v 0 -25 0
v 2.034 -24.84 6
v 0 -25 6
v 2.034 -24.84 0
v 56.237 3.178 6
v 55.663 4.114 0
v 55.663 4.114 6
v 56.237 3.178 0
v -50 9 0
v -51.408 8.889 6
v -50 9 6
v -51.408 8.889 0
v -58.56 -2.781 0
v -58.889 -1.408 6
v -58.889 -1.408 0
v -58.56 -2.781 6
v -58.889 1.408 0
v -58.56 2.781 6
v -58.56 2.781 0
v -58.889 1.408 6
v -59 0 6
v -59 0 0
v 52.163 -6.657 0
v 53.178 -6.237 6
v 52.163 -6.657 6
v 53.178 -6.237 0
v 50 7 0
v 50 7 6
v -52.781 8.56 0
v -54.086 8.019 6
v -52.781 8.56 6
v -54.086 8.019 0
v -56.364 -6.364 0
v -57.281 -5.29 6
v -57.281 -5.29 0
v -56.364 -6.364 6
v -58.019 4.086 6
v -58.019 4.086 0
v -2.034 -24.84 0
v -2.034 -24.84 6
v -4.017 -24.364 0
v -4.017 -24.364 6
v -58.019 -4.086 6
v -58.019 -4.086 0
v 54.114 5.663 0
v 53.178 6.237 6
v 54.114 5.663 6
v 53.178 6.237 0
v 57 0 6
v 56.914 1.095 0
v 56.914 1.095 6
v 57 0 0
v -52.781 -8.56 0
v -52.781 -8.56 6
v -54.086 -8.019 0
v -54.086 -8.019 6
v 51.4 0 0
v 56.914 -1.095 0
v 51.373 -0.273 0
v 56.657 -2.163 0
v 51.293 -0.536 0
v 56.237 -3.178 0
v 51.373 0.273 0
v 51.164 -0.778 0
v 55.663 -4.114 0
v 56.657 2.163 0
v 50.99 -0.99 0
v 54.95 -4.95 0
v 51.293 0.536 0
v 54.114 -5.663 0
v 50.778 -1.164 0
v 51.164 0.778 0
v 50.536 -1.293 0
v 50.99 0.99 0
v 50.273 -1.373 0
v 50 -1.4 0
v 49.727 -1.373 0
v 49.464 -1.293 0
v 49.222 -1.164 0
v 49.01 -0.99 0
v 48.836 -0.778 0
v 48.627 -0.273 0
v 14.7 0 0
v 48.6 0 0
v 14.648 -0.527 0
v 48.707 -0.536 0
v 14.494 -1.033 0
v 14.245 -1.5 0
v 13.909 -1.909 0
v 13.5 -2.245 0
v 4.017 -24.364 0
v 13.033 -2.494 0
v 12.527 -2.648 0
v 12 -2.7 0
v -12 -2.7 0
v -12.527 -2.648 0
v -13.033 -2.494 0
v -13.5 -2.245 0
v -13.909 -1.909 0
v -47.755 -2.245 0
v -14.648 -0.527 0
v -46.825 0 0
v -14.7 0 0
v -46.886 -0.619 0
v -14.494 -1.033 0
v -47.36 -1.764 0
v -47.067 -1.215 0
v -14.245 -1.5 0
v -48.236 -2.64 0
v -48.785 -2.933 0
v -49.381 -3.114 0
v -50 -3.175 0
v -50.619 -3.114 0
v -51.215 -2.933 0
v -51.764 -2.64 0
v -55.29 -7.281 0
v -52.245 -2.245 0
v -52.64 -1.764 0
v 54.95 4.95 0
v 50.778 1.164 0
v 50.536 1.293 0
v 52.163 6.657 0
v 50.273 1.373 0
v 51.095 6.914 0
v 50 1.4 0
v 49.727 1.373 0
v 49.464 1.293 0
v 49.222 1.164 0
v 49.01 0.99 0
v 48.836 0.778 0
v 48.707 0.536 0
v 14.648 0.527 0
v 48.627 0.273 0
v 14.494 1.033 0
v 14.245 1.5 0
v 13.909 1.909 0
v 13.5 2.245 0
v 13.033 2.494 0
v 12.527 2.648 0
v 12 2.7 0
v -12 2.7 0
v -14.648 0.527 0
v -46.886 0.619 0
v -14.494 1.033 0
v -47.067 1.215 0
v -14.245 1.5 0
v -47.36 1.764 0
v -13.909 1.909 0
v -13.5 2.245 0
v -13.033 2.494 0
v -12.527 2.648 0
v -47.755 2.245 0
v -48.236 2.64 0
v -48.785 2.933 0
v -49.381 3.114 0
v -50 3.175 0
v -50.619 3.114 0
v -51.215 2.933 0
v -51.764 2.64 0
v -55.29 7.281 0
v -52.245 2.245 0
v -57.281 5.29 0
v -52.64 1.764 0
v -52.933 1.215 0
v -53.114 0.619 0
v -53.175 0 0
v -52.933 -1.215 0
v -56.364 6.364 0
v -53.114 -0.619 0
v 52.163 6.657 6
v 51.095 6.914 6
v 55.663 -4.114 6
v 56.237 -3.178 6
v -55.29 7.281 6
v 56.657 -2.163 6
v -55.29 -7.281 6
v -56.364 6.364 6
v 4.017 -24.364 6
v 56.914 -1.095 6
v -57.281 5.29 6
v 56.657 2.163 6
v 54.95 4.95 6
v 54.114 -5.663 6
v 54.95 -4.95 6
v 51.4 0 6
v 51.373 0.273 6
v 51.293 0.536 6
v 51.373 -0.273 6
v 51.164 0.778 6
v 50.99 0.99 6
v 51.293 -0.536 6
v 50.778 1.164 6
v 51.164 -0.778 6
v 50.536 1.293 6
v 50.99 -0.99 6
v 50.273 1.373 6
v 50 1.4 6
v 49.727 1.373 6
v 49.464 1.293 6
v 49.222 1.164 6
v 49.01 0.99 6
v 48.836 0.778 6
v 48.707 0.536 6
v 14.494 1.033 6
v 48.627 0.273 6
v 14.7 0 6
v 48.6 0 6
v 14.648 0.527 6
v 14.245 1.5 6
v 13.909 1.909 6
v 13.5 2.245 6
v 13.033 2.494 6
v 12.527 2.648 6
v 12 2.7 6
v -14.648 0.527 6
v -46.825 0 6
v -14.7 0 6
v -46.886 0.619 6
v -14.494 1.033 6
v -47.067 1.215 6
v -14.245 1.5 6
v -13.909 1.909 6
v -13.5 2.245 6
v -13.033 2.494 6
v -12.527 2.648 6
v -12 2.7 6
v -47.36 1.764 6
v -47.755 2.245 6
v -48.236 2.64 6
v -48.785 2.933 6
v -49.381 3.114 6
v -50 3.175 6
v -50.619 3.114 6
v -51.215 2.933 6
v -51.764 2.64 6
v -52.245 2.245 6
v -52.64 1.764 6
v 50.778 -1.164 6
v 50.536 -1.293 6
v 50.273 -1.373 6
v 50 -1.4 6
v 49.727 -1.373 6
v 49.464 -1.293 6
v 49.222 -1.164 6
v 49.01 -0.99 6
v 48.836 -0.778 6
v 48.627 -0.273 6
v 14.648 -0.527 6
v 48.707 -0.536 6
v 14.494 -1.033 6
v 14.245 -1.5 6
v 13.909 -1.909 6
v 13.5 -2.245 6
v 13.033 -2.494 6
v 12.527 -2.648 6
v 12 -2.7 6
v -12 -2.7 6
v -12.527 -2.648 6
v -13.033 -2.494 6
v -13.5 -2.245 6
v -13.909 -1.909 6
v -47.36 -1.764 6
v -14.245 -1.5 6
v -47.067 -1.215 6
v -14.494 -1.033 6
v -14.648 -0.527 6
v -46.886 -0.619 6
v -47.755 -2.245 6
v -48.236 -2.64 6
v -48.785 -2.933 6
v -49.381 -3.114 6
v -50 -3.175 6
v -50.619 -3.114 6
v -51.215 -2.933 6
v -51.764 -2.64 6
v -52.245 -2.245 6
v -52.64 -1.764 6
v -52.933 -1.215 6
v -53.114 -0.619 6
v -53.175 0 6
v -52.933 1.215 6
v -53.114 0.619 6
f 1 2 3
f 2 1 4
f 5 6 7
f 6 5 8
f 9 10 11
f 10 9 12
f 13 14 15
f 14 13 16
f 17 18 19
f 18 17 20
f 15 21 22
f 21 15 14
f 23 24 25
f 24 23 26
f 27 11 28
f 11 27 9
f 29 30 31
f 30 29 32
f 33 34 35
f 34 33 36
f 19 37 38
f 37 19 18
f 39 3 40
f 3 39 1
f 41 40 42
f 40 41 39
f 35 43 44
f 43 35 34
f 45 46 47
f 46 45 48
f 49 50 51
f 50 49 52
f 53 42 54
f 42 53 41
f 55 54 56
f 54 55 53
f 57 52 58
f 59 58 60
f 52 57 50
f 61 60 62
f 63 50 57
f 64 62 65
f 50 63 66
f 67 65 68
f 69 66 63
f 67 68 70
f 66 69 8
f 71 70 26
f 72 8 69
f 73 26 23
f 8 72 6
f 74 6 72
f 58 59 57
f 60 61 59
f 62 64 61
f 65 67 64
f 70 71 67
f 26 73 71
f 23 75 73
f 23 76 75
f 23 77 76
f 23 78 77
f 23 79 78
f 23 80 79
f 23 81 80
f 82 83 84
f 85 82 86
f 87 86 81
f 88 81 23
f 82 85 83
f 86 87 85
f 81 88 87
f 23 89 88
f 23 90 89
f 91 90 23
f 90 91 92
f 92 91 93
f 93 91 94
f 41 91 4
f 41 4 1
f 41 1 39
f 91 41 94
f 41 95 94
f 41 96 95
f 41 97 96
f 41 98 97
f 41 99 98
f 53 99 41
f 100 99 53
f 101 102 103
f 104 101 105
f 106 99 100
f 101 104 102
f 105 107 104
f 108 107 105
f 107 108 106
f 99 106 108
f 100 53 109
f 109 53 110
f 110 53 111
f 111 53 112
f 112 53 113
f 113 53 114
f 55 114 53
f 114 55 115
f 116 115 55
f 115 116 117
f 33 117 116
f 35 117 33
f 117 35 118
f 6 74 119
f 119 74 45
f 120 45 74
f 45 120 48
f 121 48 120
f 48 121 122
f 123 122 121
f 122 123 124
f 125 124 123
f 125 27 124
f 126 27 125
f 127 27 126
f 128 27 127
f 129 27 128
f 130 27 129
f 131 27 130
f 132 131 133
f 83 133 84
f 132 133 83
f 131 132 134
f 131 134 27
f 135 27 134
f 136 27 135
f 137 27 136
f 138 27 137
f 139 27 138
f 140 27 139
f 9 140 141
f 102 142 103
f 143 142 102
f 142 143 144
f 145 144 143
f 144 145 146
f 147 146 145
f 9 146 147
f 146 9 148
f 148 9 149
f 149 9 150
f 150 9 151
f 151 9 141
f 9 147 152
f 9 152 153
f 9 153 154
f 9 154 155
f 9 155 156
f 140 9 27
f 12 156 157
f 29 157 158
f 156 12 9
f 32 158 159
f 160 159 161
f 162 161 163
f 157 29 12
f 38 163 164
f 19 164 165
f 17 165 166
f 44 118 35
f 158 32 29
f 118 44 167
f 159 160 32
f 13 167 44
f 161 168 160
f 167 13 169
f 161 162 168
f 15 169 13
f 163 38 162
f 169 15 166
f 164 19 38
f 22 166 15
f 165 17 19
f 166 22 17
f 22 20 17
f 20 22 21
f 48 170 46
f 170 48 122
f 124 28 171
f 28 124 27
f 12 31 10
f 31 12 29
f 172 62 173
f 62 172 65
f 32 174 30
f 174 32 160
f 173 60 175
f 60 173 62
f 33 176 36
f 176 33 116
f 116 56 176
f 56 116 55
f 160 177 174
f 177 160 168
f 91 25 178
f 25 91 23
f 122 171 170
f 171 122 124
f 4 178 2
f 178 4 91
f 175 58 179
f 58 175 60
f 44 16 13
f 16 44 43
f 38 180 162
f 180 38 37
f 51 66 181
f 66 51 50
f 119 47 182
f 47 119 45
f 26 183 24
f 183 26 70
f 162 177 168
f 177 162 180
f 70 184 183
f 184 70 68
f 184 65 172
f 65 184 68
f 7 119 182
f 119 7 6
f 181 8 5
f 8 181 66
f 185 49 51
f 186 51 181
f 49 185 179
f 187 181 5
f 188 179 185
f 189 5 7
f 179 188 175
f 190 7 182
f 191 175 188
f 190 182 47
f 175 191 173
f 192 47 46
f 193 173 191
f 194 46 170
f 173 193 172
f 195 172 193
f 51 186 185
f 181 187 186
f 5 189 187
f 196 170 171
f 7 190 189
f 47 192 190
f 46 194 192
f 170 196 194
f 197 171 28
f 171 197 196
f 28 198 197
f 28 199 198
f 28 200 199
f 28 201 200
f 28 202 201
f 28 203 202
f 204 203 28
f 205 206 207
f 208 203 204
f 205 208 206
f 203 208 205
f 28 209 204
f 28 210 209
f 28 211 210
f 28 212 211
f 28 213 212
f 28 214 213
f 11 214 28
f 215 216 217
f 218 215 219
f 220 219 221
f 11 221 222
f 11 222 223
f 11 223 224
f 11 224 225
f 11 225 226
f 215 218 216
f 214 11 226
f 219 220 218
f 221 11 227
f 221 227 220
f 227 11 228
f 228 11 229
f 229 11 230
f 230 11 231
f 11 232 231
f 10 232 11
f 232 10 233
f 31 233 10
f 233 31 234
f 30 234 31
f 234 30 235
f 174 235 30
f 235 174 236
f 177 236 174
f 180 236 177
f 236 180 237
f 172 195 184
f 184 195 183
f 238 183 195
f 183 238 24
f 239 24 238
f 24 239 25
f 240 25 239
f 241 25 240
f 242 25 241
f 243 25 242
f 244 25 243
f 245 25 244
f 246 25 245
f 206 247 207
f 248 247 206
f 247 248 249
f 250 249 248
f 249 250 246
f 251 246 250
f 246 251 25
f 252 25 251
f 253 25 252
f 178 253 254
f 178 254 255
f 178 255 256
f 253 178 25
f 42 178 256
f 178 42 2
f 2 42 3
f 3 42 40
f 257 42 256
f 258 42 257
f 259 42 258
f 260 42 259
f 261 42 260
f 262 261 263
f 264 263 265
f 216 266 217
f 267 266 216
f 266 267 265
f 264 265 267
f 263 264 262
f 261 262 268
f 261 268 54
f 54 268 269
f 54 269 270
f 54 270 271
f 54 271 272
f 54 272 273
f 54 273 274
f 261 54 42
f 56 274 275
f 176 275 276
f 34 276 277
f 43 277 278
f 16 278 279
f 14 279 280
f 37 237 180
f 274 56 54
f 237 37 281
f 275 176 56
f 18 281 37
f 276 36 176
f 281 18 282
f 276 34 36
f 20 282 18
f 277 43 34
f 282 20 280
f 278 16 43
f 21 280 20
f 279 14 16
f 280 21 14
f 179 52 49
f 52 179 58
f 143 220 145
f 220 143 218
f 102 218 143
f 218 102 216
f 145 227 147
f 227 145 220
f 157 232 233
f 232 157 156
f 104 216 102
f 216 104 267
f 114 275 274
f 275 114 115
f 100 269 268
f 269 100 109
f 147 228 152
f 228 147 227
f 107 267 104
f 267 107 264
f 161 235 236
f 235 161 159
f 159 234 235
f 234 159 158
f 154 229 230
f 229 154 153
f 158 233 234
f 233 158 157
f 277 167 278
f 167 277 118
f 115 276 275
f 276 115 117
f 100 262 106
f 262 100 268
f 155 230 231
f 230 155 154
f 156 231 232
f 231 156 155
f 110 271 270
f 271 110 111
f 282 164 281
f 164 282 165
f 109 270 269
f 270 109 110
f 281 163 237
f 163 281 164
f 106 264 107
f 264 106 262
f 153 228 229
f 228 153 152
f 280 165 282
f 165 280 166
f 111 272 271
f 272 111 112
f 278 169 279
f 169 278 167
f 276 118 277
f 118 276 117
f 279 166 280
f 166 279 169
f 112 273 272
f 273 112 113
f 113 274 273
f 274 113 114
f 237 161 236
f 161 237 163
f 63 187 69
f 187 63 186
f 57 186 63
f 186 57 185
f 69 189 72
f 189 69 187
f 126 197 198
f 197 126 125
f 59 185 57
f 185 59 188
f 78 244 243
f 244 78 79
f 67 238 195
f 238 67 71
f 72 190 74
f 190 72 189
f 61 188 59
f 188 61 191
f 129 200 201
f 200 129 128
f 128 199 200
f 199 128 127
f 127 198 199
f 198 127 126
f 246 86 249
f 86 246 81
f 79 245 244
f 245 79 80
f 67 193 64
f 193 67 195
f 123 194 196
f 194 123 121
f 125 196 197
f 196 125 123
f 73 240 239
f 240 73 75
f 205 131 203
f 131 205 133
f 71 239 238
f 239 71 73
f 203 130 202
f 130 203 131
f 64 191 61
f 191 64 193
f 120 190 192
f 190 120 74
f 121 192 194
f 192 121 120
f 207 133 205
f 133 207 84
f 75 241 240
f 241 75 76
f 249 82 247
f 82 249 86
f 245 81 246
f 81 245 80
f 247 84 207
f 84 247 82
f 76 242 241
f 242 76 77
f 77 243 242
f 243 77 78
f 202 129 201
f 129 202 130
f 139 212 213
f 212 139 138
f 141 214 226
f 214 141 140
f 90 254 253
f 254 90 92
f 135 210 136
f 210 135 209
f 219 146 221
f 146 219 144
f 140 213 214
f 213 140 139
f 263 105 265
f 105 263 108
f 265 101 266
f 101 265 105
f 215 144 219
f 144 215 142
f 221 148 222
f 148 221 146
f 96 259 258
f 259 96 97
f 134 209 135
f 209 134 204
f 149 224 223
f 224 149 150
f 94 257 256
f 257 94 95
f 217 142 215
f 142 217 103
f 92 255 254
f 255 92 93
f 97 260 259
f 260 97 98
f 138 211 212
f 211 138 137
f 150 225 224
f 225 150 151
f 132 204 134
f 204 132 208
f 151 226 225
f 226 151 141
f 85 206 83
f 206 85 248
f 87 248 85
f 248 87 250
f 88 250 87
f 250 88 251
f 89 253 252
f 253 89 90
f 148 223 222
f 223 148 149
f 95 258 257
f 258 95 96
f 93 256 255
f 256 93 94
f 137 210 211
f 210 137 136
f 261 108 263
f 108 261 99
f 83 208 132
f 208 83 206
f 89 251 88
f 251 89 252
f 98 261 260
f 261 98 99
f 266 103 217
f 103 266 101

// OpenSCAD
$fn = 32;

// ----------------------------------------------------------------------
// Lever: 100 mm between the bosses, 6 mm thick, smooth outline
// ----------------------------------------------------------------------

// --- parameters (mm) ---
lever_l = 100;            // distance between the boss centres
boss_a = 18;              // first boss diameter
boss_b = 14;              // second boss diameter
bore_a = 6.35;            // first bore
bore_b = 2.8;             // second bore
lever_t = 6;              // lever thickness
boss_c = 26;              // middle boss diameter
bend = 12;                // how far the middle boss drops
slot_w = 5.4;             // adjustment slot width

lever_profile = [[-59, 0], [-58.889, -1.408], [-58.56, -2.781], [-58.019, -4.086], [-57.281, -5.29], [-56.364, -6.364], [-55.29, -7.281], [-54.086, -8.019], [-52.781, -8.56], [-4.017, -24.364], [-2.034, -24.84], [0, -25], [2.034, -24.84], [4.017, -24.364], [52.163, -6.657], [53.178, -6.237], [54.114, -5.663], [54.95, -4.95], [55.663, -4.114], [56.237, -3.178], [56.657, -2.163], [56.914, -1.095], [57, 0], [56.914, 1.095], [56.657, 2.163], [56.237, 3.178], [55.663, 4.114], [54.95, 4.95], [54.114, 5.663], [53.178, 6.237], [52.163, 6.657], [51.095, 6.914], [50, 7], [-50, 9], [-51.408, 8.889], [-52.781, 8.56], [-54.086, 8.019], [-55.29, 7.281], [-56.364, 6.364], [-57.281, 5.29], [-58.019, 4.086], [-58.56, 2.781], [-58.889, 1.408]];

difference() {
  linear_extrude(height = lever_t) polygon(lever_profile);
  translate([-50, 0, -2.5]) cylinder(h = lever_t + 5, d = bore_a);
  translate([50, 0, -2.5]) cylinder(h = lever_t + 5, d = bore_b);
  /* slotted adjustment, stadium shaped */
  hull() {
    translate([-12, 0, -2.5]) cylinder(h = lever_t + 5, d = slot_w);
    translate([12, 0, -2.5]) cylinder(h = lever_t + 5, d = slot_w);
  }
}
